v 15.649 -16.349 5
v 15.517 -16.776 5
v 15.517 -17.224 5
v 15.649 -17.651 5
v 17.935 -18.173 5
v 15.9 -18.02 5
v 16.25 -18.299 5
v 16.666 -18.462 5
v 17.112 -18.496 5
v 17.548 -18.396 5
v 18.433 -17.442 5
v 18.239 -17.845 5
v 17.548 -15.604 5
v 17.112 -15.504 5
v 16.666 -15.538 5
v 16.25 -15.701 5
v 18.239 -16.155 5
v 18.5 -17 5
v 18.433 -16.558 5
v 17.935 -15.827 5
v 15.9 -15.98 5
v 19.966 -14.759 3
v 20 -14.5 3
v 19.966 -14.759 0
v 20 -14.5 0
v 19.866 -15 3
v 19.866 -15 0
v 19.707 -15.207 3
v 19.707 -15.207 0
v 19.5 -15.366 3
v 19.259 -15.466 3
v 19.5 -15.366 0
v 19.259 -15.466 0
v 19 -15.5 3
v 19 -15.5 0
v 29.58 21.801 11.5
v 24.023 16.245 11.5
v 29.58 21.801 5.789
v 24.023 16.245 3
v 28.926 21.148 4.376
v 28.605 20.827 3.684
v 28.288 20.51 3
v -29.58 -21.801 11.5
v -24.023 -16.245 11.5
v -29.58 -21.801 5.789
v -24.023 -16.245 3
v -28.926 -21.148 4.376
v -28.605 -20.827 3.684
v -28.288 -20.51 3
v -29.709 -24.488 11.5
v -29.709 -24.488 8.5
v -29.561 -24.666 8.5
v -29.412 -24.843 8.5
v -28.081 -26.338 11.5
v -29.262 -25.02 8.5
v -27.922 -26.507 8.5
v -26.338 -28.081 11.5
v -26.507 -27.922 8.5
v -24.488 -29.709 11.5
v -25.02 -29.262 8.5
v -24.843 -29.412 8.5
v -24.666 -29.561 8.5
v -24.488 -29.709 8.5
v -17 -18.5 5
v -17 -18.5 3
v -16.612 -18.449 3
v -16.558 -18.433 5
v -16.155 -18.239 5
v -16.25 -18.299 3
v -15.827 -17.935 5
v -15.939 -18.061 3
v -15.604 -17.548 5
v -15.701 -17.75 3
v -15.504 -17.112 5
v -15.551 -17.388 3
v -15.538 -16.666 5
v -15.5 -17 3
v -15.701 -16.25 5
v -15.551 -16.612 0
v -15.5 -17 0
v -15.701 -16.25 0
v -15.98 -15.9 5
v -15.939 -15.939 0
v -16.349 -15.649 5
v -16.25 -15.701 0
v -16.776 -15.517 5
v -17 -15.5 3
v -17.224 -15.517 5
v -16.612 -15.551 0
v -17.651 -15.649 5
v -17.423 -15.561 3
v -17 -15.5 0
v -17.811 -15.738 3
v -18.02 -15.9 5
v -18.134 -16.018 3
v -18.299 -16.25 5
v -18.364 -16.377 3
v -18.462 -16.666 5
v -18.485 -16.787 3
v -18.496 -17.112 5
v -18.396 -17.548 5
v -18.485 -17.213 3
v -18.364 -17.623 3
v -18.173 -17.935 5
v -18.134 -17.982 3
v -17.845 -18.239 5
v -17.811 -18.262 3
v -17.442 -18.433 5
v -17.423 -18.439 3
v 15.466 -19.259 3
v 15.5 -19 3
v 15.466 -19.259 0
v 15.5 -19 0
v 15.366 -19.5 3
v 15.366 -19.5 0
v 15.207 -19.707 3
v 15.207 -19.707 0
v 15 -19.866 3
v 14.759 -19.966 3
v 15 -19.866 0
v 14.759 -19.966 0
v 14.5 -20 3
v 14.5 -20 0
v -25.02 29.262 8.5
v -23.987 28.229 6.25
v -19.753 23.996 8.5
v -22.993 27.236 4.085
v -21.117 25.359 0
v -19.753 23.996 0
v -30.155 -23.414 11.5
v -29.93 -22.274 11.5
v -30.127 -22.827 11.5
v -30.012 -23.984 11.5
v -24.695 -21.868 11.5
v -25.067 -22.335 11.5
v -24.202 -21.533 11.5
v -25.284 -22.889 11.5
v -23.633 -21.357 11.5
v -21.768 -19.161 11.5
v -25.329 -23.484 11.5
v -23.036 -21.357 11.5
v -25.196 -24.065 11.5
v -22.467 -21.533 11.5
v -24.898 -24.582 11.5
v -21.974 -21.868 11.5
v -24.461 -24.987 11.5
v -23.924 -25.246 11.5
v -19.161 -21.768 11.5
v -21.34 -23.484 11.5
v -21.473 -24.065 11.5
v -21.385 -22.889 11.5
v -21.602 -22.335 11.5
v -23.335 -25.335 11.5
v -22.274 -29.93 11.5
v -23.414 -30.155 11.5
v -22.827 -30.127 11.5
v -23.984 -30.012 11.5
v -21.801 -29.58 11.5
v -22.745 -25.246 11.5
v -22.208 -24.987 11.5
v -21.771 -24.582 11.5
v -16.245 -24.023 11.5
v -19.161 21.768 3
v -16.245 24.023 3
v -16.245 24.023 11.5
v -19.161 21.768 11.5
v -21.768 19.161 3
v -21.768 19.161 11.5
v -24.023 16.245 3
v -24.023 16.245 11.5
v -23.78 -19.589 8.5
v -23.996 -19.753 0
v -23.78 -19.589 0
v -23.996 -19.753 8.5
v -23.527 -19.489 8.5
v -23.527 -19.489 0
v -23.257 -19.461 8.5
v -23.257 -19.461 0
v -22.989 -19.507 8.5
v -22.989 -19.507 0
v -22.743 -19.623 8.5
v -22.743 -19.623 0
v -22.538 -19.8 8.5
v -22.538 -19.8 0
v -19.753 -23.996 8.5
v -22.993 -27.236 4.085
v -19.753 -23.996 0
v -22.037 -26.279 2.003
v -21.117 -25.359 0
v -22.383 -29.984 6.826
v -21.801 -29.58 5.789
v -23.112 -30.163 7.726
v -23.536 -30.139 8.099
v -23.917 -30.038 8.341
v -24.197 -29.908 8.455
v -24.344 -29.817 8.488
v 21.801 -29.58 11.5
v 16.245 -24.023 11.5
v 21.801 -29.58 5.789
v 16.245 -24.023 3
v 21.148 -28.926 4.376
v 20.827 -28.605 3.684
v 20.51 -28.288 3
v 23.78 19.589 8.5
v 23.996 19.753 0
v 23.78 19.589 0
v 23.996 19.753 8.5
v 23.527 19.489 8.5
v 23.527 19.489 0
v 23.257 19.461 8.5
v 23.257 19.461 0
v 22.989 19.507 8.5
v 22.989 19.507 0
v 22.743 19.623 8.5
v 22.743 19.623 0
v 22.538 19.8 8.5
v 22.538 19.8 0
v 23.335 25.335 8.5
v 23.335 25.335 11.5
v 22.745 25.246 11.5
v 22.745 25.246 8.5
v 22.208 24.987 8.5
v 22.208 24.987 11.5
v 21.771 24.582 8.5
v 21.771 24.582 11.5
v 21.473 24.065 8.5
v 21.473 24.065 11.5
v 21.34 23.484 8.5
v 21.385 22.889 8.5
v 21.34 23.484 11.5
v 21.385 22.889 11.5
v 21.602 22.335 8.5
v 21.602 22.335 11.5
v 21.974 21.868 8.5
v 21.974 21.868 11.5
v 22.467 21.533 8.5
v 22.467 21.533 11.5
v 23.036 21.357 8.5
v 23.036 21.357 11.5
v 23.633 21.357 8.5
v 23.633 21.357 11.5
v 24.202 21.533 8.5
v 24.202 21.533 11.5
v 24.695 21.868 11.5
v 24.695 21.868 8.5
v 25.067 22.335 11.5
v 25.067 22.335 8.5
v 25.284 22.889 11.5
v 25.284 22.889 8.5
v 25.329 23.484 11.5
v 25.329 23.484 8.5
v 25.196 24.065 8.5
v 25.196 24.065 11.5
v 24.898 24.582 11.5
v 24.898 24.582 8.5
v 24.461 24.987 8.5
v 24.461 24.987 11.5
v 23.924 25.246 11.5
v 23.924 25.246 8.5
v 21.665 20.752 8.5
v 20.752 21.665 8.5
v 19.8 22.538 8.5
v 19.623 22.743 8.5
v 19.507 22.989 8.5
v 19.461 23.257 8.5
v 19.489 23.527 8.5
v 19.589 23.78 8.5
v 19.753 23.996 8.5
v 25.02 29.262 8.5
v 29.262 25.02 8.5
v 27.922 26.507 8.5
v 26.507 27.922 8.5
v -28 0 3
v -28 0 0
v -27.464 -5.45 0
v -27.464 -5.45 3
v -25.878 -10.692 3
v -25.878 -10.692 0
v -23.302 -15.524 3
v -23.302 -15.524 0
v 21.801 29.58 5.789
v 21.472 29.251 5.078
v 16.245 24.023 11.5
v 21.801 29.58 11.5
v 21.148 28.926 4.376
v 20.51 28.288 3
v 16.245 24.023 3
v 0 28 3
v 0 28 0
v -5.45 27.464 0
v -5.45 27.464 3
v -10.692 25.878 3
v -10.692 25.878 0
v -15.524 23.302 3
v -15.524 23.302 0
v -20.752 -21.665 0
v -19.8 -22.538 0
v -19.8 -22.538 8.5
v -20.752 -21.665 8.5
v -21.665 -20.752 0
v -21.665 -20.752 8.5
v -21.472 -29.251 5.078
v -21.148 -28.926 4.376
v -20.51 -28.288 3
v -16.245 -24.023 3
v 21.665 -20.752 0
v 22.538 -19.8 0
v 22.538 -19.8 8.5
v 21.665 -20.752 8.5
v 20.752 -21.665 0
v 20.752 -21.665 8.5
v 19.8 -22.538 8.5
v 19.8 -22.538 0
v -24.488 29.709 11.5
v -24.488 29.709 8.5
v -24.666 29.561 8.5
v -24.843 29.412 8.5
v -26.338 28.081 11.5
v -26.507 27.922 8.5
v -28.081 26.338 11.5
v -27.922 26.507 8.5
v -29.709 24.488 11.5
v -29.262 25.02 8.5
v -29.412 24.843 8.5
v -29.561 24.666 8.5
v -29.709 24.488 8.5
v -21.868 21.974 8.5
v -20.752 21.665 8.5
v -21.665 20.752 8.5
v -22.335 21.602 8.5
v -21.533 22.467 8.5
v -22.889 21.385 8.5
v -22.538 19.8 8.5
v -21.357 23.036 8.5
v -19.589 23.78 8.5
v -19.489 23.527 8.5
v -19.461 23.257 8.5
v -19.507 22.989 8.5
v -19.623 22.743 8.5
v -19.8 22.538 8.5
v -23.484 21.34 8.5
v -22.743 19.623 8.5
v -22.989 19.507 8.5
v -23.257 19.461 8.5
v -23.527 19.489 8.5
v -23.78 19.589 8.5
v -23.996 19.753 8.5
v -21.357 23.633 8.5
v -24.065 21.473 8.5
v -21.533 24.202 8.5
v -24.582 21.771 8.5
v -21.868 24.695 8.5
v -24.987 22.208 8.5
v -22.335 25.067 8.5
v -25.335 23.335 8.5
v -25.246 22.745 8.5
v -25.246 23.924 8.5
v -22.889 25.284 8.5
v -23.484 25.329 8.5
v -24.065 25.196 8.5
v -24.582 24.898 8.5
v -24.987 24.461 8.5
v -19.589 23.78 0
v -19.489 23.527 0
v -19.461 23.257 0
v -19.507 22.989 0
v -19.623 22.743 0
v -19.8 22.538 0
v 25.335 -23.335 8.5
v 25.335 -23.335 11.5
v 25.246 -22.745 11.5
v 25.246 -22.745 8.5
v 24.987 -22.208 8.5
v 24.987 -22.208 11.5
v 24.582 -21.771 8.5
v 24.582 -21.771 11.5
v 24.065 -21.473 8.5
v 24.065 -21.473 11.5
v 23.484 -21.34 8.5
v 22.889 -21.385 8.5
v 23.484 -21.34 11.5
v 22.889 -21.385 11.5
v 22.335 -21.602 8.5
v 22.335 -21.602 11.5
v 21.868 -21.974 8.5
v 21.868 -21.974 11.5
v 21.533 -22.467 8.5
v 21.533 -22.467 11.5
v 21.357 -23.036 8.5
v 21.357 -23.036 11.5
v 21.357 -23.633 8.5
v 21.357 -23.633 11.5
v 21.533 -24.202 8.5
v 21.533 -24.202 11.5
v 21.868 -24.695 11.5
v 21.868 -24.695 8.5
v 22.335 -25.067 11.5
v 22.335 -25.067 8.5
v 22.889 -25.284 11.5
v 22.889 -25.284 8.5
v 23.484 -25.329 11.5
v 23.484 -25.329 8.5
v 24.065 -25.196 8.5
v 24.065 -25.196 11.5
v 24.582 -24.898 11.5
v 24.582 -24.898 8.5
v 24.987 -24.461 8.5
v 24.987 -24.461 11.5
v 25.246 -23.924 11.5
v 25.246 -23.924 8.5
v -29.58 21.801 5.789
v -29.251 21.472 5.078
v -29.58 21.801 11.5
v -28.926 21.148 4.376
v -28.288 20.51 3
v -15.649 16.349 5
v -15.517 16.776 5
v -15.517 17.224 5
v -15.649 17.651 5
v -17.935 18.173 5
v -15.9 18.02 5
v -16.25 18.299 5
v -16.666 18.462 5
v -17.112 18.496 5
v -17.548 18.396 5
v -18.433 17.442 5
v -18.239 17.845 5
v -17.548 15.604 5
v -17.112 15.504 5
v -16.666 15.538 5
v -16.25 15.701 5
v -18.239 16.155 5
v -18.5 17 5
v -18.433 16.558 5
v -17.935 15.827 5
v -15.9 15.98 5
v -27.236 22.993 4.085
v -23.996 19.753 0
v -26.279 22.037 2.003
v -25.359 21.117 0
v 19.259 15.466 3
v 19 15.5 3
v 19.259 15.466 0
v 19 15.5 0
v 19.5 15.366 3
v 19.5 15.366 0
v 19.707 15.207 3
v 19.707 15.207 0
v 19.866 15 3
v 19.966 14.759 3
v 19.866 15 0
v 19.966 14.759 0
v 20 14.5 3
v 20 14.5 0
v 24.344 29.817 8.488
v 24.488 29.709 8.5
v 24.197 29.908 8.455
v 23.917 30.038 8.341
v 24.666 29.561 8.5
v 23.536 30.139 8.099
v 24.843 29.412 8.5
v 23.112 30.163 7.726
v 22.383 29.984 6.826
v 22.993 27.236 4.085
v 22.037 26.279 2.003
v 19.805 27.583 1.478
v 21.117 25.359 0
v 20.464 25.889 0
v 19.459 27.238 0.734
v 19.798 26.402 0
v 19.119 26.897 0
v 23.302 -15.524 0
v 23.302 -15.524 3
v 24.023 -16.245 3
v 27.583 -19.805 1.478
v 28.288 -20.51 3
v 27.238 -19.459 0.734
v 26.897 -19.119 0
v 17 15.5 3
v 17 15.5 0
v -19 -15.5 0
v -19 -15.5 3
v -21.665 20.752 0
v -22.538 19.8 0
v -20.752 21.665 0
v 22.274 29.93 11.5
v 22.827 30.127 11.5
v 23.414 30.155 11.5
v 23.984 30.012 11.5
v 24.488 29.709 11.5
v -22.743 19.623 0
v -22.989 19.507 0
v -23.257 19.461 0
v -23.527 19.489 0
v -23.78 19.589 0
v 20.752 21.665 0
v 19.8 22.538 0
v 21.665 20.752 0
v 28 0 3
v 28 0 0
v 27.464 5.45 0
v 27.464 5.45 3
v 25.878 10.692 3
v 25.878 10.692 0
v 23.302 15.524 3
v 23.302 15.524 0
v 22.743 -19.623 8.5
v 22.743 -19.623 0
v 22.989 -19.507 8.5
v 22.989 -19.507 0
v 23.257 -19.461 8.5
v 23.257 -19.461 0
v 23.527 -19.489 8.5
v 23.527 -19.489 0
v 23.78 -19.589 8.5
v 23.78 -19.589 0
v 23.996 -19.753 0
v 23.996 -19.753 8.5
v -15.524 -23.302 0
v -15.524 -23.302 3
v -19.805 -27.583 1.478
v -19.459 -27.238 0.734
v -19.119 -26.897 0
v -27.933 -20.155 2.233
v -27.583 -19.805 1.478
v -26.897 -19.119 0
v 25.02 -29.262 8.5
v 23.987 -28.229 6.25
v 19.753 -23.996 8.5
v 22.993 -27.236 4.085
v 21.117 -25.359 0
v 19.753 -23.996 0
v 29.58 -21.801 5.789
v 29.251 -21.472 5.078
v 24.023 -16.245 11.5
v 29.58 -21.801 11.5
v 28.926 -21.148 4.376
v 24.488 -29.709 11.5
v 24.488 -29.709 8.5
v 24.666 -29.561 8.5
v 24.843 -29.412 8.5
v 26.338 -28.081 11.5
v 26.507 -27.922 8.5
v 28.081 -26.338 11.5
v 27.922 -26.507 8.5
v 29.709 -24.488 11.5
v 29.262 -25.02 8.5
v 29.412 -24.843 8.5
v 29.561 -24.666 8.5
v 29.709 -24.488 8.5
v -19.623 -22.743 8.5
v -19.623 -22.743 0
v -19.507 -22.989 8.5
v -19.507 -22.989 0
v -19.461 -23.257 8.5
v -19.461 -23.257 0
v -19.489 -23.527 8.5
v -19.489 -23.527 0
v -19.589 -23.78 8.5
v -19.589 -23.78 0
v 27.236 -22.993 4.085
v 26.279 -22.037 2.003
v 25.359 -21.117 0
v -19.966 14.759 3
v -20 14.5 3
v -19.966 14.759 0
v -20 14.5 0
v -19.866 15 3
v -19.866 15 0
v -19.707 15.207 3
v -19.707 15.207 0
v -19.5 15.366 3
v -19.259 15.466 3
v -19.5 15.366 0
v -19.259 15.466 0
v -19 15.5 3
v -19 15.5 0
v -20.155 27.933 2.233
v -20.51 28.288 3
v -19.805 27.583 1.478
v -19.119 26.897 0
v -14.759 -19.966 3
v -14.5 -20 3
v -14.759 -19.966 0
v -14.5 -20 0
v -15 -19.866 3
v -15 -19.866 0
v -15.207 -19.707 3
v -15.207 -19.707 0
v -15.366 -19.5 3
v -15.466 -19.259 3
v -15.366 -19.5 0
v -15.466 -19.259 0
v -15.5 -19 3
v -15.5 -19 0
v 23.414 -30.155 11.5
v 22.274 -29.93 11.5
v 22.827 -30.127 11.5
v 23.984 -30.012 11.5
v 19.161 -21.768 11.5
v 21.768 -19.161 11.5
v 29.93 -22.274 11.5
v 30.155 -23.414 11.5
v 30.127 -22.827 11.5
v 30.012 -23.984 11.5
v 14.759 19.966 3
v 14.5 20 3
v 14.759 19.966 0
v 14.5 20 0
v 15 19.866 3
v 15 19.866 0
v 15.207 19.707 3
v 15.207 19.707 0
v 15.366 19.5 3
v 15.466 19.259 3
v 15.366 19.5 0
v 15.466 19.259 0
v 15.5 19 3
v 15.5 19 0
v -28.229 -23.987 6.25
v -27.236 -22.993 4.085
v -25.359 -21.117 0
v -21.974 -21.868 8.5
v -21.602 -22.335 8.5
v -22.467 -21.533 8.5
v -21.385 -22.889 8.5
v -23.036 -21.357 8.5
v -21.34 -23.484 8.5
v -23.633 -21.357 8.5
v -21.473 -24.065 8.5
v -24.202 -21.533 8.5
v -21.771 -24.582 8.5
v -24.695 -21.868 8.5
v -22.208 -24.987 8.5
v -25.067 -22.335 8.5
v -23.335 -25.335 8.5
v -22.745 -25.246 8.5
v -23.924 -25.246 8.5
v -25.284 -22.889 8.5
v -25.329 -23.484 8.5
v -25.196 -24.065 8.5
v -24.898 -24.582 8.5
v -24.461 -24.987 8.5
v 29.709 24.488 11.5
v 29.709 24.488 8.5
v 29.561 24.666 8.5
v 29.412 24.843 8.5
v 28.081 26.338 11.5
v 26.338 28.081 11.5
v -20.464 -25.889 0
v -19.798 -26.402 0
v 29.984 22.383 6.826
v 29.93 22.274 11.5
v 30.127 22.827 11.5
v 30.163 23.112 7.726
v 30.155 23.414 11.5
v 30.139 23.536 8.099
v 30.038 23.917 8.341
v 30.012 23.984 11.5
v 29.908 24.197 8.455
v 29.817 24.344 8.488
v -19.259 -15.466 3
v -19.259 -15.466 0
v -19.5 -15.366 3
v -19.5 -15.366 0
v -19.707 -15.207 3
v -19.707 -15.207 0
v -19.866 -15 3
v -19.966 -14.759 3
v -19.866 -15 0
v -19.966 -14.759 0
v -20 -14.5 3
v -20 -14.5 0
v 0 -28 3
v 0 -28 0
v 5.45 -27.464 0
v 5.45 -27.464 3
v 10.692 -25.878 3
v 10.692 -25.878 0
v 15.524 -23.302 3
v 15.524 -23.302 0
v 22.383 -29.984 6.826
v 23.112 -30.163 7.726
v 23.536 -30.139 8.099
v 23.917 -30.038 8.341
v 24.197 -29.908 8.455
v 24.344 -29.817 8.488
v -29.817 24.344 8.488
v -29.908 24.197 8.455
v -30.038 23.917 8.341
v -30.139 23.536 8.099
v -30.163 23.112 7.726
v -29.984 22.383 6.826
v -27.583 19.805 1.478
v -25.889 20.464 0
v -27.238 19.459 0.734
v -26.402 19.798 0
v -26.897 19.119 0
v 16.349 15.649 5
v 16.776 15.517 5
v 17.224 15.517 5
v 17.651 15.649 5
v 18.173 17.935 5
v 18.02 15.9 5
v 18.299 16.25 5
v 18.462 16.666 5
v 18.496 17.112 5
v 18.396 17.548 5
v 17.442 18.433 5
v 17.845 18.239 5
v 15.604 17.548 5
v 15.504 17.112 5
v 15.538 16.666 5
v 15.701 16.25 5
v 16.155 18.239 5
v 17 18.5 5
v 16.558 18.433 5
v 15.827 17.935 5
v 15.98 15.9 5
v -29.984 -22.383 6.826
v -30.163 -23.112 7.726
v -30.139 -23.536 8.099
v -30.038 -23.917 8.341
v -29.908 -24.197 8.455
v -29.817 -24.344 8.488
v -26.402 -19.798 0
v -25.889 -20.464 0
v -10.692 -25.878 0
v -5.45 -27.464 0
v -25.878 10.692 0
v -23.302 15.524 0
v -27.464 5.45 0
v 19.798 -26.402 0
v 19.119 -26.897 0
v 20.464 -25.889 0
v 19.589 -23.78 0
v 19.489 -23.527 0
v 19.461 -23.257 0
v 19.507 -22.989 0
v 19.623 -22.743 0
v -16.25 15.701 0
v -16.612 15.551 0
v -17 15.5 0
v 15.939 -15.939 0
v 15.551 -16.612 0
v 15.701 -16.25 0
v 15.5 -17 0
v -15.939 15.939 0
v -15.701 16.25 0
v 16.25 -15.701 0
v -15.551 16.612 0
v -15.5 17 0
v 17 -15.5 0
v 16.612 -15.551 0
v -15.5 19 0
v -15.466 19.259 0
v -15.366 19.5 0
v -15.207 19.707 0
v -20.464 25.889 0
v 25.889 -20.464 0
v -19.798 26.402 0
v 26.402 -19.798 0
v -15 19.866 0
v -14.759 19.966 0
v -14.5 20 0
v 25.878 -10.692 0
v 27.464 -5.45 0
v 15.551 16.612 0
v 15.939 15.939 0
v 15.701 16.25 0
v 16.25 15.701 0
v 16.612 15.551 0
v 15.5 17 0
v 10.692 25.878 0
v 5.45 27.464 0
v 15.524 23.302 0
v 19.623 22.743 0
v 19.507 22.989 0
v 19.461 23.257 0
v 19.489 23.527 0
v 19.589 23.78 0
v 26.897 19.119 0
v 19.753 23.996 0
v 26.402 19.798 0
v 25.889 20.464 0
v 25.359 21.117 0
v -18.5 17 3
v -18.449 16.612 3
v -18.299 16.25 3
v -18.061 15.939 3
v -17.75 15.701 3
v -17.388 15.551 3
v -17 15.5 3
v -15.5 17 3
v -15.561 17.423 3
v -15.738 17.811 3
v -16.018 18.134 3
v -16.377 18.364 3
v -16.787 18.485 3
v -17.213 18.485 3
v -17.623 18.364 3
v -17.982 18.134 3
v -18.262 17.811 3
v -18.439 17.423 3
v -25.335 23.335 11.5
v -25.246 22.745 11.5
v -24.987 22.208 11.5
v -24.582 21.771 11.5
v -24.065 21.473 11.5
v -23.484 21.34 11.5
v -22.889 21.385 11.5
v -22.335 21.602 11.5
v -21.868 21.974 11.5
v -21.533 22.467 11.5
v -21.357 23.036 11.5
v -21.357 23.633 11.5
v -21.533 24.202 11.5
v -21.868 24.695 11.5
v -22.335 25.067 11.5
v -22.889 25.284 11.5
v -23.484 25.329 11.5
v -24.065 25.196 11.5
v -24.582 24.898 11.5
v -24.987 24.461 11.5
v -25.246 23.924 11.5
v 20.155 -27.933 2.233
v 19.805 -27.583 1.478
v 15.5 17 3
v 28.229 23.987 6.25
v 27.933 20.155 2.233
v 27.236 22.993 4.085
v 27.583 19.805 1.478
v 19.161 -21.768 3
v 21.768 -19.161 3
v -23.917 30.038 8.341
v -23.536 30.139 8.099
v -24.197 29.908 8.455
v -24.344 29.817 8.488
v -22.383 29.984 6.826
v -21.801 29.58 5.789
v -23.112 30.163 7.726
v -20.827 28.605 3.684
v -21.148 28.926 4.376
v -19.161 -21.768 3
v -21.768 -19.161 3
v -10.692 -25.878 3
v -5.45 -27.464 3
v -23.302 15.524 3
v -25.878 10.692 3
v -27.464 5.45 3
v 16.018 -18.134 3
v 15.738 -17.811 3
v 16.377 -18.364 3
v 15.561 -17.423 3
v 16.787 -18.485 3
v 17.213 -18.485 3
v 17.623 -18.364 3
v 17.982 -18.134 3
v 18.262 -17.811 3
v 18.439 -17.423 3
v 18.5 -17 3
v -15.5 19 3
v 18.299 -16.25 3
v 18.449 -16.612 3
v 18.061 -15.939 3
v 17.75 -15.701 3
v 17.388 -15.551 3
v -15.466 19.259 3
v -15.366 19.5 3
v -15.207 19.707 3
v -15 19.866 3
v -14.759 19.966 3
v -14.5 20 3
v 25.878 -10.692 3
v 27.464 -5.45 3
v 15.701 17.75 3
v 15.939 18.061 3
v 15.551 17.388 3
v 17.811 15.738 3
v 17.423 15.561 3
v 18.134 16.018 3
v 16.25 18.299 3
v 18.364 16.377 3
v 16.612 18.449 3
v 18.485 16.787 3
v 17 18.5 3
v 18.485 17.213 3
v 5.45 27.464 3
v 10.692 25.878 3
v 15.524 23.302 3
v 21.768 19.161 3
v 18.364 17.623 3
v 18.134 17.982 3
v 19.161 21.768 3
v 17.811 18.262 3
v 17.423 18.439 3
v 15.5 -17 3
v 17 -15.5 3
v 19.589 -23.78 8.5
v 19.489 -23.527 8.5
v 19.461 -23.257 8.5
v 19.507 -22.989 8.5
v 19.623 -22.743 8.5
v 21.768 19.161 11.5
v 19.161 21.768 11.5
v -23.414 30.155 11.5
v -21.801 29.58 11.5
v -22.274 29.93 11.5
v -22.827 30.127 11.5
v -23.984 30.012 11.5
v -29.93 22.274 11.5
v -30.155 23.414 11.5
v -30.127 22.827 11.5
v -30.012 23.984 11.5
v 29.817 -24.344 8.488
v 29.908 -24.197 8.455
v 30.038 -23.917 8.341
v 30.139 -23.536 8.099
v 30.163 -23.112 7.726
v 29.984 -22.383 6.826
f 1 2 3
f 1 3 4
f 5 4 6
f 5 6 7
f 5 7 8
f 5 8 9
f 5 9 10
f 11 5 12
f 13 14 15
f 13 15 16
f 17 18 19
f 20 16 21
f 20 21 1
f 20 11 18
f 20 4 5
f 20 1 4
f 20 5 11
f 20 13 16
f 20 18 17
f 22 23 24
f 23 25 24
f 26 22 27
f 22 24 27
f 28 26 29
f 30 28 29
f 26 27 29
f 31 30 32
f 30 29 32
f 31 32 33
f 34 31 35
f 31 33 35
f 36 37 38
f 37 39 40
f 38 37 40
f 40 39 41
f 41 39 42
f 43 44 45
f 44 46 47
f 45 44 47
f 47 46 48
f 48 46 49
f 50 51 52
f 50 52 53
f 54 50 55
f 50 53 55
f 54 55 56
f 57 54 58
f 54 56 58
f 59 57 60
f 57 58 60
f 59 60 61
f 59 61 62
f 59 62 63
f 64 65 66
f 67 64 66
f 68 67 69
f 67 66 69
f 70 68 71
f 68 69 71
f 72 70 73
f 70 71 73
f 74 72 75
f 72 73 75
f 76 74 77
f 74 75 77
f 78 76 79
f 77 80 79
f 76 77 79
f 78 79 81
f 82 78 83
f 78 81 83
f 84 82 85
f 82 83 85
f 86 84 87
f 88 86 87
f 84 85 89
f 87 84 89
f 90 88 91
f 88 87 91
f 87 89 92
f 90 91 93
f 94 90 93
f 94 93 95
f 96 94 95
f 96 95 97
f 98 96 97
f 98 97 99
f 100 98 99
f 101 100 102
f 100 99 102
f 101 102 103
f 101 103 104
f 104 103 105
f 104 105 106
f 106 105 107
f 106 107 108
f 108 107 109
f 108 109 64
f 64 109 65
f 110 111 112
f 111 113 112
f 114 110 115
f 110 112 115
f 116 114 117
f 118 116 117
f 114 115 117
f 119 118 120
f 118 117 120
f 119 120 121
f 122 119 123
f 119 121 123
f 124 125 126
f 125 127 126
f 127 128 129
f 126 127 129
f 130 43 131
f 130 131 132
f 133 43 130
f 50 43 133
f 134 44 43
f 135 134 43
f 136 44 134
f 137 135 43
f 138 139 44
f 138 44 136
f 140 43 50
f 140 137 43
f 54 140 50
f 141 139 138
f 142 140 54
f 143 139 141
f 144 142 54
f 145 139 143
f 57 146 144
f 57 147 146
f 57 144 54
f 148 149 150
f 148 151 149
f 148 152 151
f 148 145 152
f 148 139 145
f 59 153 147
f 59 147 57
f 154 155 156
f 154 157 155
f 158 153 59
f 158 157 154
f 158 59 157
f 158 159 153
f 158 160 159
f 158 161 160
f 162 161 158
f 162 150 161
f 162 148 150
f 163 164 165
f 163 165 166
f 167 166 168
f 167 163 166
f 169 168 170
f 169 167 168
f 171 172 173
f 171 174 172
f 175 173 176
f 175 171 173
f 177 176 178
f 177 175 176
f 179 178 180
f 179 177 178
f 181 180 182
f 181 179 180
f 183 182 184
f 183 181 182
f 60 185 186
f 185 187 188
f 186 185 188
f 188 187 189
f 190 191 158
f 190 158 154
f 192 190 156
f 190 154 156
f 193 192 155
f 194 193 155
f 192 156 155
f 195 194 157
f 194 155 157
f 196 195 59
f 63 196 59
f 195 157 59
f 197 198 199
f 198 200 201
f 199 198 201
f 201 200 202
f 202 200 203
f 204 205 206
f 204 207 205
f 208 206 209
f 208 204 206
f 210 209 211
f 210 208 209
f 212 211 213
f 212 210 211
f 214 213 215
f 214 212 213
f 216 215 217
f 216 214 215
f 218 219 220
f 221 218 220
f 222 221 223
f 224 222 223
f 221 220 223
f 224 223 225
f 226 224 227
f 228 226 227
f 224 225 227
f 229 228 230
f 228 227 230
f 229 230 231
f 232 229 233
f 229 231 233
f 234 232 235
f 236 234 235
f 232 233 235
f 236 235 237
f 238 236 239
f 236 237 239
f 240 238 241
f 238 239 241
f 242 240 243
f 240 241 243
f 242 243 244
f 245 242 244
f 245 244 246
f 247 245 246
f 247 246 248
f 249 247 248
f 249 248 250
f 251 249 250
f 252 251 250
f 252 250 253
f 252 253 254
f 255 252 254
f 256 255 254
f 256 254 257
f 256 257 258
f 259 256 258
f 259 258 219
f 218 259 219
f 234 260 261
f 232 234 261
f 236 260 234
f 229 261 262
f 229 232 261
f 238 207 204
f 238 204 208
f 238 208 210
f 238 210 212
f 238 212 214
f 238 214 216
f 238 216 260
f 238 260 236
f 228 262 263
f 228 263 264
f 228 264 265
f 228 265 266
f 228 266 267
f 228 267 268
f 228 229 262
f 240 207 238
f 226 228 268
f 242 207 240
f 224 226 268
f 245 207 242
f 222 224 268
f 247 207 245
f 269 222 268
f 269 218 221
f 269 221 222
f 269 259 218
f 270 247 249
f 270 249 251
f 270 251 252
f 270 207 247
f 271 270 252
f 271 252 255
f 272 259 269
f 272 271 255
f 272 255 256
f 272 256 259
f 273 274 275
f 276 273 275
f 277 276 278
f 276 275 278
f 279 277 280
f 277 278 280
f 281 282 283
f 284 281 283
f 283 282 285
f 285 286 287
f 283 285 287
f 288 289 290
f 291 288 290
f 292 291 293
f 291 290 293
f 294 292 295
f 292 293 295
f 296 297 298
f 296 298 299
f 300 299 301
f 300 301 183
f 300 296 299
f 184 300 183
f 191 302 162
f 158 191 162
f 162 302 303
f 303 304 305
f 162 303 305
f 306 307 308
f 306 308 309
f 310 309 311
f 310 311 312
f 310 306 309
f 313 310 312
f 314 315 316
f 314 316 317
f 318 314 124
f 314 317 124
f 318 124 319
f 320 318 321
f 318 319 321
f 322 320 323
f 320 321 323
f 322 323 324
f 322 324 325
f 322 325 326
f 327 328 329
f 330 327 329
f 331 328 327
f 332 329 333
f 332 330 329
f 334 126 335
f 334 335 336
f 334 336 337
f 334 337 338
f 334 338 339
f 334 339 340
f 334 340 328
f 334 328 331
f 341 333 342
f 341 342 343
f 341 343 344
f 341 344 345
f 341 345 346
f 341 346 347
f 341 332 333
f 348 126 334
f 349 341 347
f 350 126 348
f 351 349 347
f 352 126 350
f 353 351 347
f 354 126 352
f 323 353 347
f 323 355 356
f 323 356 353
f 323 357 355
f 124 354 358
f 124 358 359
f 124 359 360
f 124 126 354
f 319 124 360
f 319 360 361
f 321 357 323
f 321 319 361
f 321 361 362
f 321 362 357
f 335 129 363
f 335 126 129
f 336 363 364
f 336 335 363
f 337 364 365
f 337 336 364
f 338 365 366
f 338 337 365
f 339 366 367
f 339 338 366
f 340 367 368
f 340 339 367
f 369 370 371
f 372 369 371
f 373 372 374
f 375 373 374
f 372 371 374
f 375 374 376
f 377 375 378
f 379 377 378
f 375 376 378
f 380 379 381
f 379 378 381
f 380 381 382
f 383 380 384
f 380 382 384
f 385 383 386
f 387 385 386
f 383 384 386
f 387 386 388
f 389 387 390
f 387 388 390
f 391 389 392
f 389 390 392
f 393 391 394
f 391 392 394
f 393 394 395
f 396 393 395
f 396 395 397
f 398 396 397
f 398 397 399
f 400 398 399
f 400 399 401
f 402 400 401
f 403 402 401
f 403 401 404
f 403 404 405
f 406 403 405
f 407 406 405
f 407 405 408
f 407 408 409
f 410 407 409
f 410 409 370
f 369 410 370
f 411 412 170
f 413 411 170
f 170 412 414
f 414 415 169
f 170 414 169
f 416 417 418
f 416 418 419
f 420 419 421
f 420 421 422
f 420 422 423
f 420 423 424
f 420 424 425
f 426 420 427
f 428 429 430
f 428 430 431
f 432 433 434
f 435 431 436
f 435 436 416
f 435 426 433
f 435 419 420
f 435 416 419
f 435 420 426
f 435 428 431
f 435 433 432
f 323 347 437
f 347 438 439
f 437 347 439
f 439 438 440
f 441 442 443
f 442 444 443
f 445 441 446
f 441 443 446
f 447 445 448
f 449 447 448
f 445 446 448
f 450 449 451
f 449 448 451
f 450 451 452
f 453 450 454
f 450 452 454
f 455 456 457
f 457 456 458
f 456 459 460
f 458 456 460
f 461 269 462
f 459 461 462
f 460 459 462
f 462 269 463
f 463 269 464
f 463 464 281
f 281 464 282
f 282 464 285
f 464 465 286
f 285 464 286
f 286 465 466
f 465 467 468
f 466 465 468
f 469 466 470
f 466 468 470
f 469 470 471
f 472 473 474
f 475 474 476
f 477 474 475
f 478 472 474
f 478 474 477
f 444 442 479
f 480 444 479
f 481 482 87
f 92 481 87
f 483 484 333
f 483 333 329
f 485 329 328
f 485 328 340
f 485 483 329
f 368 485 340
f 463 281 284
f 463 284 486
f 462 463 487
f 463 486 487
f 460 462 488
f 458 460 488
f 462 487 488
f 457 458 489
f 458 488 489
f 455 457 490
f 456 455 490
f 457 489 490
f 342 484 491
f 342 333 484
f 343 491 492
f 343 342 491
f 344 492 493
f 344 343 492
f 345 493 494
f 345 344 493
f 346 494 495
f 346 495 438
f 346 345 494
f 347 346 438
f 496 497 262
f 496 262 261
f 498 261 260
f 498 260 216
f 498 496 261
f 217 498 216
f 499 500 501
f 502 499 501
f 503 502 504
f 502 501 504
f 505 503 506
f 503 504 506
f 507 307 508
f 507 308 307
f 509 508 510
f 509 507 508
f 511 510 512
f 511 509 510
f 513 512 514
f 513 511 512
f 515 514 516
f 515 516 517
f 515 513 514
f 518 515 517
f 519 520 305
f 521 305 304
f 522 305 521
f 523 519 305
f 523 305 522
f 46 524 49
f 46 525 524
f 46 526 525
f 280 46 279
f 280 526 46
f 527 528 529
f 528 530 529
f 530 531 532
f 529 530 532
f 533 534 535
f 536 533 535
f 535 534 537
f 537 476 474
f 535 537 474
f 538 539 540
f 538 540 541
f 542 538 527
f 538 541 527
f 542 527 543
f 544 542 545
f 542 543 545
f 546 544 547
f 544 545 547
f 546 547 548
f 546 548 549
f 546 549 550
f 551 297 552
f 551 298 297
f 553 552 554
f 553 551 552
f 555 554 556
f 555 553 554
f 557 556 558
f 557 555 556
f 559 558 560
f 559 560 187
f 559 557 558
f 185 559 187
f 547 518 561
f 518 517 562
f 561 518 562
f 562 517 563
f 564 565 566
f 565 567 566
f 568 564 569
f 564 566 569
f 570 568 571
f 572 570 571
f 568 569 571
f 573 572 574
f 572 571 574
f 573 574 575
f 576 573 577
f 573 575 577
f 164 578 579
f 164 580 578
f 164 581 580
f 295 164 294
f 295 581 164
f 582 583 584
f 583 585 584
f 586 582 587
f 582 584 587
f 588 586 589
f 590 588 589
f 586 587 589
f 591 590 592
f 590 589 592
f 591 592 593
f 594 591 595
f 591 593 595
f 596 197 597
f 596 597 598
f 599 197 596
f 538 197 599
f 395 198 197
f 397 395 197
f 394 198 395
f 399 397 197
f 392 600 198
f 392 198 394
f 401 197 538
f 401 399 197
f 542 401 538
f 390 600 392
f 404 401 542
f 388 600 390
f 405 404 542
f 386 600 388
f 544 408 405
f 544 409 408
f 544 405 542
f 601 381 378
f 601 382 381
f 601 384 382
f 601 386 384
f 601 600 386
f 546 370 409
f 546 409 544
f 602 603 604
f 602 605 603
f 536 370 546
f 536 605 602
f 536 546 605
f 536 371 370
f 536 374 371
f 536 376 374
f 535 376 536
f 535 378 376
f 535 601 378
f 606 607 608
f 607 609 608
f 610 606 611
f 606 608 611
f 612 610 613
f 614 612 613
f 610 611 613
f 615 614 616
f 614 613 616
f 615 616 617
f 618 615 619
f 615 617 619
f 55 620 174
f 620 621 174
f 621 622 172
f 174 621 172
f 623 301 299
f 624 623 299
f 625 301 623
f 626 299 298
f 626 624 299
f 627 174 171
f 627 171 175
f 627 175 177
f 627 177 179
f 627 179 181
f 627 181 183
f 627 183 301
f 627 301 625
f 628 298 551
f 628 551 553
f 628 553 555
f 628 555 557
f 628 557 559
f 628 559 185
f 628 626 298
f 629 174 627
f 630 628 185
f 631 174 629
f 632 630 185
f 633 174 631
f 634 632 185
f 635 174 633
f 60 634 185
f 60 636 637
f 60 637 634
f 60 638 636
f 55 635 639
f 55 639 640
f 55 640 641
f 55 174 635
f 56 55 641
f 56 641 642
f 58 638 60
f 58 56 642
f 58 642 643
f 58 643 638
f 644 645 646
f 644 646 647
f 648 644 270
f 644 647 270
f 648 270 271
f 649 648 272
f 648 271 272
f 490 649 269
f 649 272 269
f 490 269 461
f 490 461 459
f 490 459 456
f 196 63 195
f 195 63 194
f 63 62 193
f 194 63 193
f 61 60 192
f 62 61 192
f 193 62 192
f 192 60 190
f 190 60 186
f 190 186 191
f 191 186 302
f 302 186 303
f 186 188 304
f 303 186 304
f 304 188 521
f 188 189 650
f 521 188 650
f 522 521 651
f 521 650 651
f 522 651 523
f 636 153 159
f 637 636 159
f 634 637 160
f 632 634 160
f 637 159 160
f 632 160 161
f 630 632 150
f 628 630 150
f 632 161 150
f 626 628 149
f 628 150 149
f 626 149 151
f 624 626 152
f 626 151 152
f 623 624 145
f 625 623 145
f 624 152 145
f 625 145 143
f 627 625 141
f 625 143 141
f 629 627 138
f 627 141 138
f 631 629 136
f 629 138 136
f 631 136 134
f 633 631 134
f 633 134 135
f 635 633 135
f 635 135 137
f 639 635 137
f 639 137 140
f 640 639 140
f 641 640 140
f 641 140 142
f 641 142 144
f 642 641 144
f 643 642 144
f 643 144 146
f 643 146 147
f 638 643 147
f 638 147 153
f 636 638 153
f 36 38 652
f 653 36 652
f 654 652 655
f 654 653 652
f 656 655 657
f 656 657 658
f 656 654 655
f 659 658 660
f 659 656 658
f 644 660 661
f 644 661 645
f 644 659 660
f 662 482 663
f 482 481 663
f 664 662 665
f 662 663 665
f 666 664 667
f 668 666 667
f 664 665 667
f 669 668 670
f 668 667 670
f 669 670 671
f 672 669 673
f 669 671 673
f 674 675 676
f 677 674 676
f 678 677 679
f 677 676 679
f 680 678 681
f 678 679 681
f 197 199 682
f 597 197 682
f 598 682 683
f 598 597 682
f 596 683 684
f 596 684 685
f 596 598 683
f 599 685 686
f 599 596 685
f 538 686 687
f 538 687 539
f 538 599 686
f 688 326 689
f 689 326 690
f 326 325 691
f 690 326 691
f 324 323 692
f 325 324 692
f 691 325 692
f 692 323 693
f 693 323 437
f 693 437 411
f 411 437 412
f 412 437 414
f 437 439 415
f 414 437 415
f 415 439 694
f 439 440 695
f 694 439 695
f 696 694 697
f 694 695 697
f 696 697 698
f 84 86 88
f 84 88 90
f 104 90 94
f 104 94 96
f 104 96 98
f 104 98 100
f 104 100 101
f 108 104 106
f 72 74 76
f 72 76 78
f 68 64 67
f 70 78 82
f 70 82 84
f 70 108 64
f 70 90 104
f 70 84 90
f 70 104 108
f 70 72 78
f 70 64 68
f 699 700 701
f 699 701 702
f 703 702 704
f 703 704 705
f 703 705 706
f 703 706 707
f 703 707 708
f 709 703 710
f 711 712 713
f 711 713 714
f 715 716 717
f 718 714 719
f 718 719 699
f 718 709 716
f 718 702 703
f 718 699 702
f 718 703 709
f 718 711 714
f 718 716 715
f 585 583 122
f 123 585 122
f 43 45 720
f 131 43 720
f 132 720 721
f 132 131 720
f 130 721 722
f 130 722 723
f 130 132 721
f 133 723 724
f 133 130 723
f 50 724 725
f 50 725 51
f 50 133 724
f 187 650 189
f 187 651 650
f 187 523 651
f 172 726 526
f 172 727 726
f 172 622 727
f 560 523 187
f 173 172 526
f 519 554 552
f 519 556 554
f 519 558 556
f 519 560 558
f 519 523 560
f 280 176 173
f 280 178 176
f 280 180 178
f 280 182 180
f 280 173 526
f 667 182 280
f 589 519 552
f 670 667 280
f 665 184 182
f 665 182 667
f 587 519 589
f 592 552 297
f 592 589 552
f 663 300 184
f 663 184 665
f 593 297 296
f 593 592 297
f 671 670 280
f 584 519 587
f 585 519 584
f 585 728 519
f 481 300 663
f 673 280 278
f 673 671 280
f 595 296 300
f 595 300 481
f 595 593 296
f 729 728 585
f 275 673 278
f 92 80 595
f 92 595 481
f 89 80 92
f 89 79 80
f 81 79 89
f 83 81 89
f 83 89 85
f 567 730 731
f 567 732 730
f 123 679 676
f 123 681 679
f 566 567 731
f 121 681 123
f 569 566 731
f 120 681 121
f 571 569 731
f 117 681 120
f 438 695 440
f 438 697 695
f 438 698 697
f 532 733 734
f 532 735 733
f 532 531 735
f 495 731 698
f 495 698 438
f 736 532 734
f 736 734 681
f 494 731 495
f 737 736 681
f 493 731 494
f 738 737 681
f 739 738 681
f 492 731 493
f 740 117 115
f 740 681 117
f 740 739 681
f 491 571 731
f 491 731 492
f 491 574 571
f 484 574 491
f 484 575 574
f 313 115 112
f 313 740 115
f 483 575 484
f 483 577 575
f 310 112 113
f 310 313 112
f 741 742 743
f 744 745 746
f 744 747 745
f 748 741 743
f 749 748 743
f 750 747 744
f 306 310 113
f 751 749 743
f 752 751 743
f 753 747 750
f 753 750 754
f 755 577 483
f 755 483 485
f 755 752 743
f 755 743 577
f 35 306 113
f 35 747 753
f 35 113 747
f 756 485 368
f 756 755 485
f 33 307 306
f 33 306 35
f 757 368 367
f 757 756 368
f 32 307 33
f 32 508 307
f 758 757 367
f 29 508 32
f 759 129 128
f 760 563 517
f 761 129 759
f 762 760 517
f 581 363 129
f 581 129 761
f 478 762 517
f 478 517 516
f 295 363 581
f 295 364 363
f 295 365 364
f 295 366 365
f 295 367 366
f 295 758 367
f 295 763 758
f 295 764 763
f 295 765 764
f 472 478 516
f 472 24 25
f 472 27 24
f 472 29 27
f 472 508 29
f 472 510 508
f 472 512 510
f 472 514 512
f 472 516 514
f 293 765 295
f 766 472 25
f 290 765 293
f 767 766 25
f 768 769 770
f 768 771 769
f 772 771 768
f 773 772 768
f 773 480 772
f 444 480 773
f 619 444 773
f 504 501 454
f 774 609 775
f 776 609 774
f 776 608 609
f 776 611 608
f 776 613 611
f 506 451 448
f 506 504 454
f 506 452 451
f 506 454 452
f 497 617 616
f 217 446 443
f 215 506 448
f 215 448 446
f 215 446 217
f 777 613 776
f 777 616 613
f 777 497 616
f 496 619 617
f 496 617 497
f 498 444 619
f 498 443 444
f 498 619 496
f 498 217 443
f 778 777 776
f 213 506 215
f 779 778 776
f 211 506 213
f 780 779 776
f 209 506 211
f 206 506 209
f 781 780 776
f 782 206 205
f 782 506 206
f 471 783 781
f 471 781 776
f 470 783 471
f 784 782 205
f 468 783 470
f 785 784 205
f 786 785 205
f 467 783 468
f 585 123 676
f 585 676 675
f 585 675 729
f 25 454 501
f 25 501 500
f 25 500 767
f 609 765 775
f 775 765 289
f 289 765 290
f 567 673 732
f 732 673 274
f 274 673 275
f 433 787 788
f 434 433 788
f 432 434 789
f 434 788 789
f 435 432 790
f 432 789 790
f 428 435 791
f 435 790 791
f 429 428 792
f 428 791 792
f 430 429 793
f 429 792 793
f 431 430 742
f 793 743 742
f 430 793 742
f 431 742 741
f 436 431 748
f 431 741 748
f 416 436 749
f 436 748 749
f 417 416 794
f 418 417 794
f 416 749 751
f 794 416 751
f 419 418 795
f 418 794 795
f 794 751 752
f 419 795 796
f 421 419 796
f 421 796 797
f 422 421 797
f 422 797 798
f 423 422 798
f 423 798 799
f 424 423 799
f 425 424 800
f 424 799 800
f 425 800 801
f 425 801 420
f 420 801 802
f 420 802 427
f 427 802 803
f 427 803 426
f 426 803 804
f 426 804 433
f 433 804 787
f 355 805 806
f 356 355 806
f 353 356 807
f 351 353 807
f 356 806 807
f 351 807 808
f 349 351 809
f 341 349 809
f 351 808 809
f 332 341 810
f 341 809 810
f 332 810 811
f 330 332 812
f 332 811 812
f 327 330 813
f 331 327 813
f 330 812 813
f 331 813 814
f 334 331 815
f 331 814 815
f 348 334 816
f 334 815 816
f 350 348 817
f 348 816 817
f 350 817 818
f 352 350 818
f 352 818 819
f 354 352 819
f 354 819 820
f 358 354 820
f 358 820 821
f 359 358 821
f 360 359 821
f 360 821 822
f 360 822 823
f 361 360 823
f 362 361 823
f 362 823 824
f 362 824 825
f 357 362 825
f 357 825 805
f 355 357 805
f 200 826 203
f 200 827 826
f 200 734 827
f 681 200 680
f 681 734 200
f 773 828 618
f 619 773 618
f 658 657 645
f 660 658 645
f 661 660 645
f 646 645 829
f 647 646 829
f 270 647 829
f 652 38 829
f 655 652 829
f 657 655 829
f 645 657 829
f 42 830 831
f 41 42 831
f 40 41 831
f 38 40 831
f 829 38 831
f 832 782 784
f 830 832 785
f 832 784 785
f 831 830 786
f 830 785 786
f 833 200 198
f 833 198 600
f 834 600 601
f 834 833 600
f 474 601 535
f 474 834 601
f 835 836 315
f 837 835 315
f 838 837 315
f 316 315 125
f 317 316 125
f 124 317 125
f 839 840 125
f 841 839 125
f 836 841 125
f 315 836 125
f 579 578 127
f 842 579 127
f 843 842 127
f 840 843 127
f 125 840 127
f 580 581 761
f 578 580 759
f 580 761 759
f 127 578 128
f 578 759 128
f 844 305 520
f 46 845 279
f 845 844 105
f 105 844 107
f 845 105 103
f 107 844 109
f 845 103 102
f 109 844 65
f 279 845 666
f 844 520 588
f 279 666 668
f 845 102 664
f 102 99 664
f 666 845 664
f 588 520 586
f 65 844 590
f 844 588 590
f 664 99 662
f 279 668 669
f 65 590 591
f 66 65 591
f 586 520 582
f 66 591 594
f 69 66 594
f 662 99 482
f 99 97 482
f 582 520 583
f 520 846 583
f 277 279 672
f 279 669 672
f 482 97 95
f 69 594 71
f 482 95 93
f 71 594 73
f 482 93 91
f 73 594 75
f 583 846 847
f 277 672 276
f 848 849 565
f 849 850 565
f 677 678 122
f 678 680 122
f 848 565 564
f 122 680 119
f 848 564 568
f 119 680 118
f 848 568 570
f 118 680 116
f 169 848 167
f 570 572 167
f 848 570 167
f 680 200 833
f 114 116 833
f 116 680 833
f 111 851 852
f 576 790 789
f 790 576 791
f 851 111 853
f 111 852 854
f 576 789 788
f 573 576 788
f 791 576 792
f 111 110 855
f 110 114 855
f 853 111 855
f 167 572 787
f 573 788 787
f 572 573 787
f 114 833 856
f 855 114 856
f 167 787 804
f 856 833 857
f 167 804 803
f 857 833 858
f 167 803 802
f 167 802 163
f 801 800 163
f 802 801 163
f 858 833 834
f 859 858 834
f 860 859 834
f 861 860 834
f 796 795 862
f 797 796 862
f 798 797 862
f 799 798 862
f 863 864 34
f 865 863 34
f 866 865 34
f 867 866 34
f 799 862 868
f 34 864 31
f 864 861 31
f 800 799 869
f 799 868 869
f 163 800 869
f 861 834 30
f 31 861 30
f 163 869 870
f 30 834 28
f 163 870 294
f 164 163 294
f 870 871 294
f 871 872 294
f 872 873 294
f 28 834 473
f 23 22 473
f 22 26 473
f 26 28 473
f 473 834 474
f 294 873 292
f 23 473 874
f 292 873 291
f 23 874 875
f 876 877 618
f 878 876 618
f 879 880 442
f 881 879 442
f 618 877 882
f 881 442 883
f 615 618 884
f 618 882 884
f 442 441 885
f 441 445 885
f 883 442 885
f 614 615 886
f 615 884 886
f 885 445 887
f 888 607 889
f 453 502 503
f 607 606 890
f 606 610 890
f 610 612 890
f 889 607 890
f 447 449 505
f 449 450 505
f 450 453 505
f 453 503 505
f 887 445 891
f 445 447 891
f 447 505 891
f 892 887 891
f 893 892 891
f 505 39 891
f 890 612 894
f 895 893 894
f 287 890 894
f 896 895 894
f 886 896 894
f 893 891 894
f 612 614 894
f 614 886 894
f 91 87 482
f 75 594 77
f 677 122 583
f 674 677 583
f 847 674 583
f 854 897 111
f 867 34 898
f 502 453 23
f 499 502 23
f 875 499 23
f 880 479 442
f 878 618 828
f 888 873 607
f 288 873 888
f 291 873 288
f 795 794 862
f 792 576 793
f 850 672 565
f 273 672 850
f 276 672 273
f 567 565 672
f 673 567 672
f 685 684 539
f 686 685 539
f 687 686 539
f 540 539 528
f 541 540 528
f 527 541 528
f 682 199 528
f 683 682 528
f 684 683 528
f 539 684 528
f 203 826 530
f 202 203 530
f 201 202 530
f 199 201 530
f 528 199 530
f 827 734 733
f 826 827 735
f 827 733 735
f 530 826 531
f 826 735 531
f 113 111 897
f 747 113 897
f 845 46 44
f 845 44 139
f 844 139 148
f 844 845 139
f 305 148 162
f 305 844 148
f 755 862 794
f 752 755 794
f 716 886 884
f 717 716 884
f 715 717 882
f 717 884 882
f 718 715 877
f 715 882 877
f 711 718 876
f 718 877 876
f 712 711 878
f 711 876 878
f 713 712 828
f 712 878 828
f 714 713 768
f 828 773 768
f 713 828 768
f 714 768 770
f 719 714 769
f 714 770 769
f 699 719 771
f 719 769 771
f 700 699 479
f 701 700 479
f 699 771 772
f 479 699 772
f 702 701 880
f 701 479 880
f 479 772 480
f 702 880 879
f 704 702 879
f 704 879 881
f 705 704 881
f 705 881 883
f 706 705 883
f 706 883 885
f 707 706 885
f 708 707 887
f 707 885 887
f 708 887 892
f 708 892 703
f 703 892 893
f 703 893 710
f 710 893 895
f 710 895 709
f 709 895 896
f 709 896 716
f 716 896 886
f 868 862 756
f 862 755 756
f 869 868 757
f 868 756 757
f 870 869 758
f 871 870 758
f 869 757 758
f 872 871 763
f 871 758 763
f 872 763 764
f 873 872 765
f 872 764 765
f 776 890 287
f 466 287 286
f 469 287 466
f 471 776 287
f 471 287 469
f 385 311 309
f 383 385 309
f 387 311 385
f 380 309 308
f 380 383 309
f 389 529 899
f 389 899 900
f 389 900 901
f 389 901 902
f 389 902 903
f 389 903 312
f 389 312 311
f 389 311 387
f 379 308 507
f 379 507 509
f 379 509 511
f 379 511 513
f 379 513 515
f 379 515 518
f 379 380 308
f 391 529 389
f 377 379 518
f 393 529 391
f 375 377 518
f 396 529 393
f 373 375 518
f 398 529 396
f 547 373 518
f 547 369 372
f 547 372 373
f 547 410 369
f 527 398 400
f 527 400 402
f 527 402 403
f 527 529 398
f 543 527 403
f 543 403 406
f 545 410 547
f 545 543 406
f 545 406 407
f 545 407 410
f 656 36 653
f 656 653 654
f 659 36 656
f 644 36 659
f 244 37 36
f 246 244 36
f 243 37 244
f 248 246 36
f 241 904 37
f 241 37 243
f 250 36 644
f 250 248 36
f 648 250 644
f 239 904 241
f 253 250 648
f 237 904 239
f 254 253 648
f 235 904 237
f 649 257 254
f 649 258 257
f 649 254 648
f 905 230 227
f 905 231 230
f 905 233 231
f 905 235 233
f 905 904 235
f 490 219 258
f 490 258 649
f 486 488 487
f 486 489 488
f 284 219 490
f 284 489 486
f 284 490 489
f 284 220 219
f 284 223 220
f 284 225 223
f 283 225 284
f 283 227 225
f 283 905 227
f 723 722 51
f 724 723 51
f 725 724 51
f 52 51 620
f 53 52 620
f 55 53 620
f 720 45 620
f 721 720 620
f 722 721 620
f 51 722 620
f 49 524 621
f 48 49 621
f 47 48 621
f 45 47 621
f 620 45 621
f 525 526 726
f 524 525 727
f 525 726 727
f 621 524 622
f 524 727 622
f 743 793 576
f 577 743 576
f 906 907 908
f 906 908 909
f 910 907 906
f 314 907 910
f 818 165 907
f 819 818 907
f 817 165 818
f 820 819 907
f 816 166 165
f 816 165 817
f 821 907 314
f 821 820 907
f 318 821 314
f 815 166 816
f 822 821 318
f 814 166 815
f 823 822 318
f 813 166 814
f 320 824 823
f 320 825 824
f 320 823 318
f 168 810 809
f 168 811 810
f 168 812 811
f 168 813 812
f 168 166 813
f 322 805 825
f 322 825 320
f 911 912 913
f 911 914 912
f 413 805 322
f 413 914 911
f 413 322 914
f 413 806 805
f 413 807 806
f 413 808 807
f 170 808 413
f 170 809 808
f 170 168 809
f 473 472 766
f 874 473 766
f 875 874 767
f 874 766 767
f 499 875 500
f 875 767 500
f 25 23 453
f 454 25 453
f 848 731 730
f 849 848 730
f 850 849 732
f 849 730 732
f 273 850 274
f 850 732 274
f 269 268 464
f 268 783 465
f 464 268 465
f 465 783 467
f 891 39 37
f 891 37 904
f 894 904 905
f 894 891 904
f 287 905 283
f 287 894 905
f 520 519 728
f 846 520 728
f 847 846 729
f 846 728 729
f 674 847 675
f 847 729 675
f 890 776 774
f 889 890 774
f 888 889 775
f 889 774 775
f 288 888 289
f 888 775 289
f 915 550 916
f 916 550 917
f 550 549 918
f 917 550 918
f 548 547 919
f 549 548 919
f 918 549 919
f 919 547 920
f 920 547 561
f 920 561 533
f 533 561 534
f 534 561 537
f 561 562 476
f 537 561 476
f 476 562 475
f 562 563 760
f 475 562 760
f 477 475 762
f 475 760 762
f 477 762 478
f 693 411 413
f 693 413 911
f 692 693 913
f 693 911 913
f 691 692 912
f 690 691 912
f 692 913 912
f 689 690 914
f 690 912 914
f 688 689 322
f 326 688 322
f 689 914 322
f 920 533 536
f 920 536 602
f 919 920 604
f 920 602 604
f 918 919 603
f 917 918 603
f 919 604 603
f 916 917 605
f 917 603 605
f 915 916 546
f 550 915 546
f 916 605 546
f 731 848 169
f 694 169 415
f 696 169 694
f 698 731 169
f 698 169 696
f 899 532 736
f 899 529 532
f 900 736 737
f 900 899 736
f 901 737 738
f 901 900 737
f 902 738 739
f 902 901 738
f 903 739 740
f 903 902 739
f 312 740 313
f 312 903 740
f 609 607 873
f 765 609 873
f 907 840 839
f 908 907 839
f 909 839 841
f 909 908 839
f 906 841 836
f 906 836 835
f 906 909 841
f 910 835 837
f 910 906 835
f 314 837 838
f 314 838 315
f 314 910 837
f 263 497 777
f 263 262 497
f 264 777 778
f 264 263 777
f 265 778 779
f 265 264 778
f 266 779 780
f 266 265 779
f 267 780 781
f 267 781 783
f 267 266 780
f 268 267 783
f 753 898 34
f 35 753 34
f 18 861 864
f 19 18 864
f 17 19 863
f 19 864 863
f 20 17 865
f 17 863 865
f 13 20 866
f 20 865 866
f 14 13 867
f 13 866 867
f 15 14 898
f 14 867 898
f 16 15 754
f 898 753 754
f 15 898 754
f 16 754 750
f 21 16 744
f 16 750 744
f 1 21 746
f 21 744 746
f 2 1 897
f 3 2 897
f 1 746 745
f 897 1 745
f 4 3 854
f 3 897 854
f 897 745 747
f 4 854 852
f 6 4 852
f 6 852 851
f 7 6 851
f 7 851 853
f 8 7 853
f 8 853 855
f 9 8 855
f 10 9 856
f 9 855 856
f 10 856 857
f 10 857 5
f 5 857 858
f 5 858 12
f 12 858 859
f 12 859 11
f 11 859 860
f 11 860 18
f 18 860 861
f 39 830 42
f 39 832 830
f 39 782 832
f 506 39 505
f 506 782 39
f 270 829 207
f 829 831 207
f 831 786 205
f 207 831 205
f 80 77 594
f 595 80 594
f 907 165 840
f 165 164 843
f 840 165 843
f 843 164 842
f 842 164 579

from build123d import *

# Parameters (mm, degrees)
PAD_DEPTH          = 3
POCKET_DEPTH       = 3.001
FILLET_R           = 1.5
PAD001_DEPTH       = 8.5
SKETCH004_R        = 2
POCKET001_DEPTH    = 11.501
POCKET002_DEPTH    = 8.5
SKETCH007_R        = 1.5
PAD002_DEPTH       = 2
FILLET001_R        = 1
FILLET002_R        = 2
POLARPATTERN_COUNT = 4


with BuildPart() as part:
    # Sketch → Pad (new body)
    with BuildSketch(Plane.XY):
        with BuildLine():
            Line((0, 0), (28, 0))
            ThreePointArc((23.302356, -15.524181), (26.799869, -8.109687), (28, 0))
            Line((23.302356, -15.524181), (30.833474, -23.0553))
            ThreePointArc((23.0553, -30.833474), (27.223611, -27.223611), (30.833474, -23.0553))
            Line((23.0553, -30.833474), (15.524181, -23.302356))
            ThreePointArc((0, -28), (8.109687, -26.799869), (15.524181, -23.302356))
            Line((0, -28), (0, 0))
        make_face()
    extrude(amount=PAD_DEPTH)

    # Sketch002 (on Face9 of Pad) → Pocket (cut, through all)
    with BuildSketch(Plane.XY.offset(3)):
        Polygon((0, 0), (0, -20), (15.5, -20), (15.5, -15.5), (20, -15.5), (20, 0), align=None)
    extrude(amount=-POCKET_DEPTH, mode=Mode.SUBTRACT)

    # Fillet
    fillet_edges = [part.edges().sort_by_distance(p)[0] for p in [
        (15.5, -15.5, 1.5),
    ]]
    fillet(fillet_edges, radius=FILLET_R)

    # Sketch003 (on Face14 of Fillet) → Pad001 (join)
    with BuildSketch(Plane.XY.offset(3)):
        with BuildLine():
            Line((16.244839, -24.023014), (23.0553, -30.833474))
            ThreePointArc((23.0553, -30.833474), (27.223611, -27.223611), (30.833474, -23.0553))
            Line((30.833474, -23.0553), (24.023014, -16.244839))
            ThreePointArc((16.244839, -24.023014), (20.506097, -20.506097), (24.023014, -16.244839))
        make_face()
    extrude(amount=PAD001_DEPTH)

    # Sketch004 (on Face13 of Pad001) → Pocket001 (cut, through all)
    with BuildSketch(Plane.XY.offset(11.5)):
        with Locations((23.334524, -23.334524)):
            Circle(SKETCH004_R)
    extrude(amount=-POCKET001_DEPTH, mode=Mode.SUBTRACT)

    # Sketch005 (on Face1 of Pocket001) → Pocket002 (cut)
    with BuildSketch(Plane(origin=(0, 0, 0), x_dir=(1, 0, 0), z_dir=(0, 0, -1))):
        with BuildLine():
            ThreePointArc((29.262157, 25.019516), (27.223611, 27.223611), (25.019516, 29.262157))
            Line((25.019516, 29.262157), (18.985551, 23.228191))
            ThreePointArc((23.228191, 18.985551), (21.213203, 21.213203), (18.985551, 23.228191))
            Line((23.228191, 18.985551), (29.262157, 25.019516))
        make_face()
    extrude(amount=-POCKET002_DEPTH, mode=Mode.SUBTRACT)

    # Sketch006 → Groove (revolve, cut)
    with BuildSketch(Plane.YZ):
        Polygon((-38.5, 0), (-38.5, 8.5), (-33, 0), align=None)
    revolve(axis=Axis((0, 0, 0), (0, 0, 1)), mode=Mode.SUBTRACT)

    # Sketch007 (on Face18 of Groove) → Pad002 (join)
    with BuildSketch(Plane.XY.offset(3)):
        with Locations((17, -17)):
            Circle(SKETCH007_R)
    extrude(amount=PAD002_DEPTH)

    # Fillet001
    fillet001_edges = [part.edges().sort_by_distance(p)[0] for p in [
        (20, -15.5, 1.5),
        (15.5, -20, 1.5),
        (18.985551, -23.228191, 4.25),
        (23.228191, -18.985551, 4.25),
    ]]
    fillet(fillet001_edges, radius=FILLET001_R)

    # Fillet002
    fillet002_edges = [part.edges().sort_by_distance(p)[0] for p in [
        (30.833474, -23.0553, 10),
        (23.0553, -30.833474, 10),
    ]]
    fillet(fillet002_edges, radius=FILLET002_R)

    # PolarPattern: part ×4 about axis
    polarpattern_axis = Axis((0, 0, 0), (0, 0, 1))


with BuildPart() as part_1:
    add(part.part)
    for i in range(1, POLARPATTERN_COUNT):
        add(part.part.rotate(polarpattern_axis, i * 360 / POLARPATTERN_COUNT))


solid = part_1.part
